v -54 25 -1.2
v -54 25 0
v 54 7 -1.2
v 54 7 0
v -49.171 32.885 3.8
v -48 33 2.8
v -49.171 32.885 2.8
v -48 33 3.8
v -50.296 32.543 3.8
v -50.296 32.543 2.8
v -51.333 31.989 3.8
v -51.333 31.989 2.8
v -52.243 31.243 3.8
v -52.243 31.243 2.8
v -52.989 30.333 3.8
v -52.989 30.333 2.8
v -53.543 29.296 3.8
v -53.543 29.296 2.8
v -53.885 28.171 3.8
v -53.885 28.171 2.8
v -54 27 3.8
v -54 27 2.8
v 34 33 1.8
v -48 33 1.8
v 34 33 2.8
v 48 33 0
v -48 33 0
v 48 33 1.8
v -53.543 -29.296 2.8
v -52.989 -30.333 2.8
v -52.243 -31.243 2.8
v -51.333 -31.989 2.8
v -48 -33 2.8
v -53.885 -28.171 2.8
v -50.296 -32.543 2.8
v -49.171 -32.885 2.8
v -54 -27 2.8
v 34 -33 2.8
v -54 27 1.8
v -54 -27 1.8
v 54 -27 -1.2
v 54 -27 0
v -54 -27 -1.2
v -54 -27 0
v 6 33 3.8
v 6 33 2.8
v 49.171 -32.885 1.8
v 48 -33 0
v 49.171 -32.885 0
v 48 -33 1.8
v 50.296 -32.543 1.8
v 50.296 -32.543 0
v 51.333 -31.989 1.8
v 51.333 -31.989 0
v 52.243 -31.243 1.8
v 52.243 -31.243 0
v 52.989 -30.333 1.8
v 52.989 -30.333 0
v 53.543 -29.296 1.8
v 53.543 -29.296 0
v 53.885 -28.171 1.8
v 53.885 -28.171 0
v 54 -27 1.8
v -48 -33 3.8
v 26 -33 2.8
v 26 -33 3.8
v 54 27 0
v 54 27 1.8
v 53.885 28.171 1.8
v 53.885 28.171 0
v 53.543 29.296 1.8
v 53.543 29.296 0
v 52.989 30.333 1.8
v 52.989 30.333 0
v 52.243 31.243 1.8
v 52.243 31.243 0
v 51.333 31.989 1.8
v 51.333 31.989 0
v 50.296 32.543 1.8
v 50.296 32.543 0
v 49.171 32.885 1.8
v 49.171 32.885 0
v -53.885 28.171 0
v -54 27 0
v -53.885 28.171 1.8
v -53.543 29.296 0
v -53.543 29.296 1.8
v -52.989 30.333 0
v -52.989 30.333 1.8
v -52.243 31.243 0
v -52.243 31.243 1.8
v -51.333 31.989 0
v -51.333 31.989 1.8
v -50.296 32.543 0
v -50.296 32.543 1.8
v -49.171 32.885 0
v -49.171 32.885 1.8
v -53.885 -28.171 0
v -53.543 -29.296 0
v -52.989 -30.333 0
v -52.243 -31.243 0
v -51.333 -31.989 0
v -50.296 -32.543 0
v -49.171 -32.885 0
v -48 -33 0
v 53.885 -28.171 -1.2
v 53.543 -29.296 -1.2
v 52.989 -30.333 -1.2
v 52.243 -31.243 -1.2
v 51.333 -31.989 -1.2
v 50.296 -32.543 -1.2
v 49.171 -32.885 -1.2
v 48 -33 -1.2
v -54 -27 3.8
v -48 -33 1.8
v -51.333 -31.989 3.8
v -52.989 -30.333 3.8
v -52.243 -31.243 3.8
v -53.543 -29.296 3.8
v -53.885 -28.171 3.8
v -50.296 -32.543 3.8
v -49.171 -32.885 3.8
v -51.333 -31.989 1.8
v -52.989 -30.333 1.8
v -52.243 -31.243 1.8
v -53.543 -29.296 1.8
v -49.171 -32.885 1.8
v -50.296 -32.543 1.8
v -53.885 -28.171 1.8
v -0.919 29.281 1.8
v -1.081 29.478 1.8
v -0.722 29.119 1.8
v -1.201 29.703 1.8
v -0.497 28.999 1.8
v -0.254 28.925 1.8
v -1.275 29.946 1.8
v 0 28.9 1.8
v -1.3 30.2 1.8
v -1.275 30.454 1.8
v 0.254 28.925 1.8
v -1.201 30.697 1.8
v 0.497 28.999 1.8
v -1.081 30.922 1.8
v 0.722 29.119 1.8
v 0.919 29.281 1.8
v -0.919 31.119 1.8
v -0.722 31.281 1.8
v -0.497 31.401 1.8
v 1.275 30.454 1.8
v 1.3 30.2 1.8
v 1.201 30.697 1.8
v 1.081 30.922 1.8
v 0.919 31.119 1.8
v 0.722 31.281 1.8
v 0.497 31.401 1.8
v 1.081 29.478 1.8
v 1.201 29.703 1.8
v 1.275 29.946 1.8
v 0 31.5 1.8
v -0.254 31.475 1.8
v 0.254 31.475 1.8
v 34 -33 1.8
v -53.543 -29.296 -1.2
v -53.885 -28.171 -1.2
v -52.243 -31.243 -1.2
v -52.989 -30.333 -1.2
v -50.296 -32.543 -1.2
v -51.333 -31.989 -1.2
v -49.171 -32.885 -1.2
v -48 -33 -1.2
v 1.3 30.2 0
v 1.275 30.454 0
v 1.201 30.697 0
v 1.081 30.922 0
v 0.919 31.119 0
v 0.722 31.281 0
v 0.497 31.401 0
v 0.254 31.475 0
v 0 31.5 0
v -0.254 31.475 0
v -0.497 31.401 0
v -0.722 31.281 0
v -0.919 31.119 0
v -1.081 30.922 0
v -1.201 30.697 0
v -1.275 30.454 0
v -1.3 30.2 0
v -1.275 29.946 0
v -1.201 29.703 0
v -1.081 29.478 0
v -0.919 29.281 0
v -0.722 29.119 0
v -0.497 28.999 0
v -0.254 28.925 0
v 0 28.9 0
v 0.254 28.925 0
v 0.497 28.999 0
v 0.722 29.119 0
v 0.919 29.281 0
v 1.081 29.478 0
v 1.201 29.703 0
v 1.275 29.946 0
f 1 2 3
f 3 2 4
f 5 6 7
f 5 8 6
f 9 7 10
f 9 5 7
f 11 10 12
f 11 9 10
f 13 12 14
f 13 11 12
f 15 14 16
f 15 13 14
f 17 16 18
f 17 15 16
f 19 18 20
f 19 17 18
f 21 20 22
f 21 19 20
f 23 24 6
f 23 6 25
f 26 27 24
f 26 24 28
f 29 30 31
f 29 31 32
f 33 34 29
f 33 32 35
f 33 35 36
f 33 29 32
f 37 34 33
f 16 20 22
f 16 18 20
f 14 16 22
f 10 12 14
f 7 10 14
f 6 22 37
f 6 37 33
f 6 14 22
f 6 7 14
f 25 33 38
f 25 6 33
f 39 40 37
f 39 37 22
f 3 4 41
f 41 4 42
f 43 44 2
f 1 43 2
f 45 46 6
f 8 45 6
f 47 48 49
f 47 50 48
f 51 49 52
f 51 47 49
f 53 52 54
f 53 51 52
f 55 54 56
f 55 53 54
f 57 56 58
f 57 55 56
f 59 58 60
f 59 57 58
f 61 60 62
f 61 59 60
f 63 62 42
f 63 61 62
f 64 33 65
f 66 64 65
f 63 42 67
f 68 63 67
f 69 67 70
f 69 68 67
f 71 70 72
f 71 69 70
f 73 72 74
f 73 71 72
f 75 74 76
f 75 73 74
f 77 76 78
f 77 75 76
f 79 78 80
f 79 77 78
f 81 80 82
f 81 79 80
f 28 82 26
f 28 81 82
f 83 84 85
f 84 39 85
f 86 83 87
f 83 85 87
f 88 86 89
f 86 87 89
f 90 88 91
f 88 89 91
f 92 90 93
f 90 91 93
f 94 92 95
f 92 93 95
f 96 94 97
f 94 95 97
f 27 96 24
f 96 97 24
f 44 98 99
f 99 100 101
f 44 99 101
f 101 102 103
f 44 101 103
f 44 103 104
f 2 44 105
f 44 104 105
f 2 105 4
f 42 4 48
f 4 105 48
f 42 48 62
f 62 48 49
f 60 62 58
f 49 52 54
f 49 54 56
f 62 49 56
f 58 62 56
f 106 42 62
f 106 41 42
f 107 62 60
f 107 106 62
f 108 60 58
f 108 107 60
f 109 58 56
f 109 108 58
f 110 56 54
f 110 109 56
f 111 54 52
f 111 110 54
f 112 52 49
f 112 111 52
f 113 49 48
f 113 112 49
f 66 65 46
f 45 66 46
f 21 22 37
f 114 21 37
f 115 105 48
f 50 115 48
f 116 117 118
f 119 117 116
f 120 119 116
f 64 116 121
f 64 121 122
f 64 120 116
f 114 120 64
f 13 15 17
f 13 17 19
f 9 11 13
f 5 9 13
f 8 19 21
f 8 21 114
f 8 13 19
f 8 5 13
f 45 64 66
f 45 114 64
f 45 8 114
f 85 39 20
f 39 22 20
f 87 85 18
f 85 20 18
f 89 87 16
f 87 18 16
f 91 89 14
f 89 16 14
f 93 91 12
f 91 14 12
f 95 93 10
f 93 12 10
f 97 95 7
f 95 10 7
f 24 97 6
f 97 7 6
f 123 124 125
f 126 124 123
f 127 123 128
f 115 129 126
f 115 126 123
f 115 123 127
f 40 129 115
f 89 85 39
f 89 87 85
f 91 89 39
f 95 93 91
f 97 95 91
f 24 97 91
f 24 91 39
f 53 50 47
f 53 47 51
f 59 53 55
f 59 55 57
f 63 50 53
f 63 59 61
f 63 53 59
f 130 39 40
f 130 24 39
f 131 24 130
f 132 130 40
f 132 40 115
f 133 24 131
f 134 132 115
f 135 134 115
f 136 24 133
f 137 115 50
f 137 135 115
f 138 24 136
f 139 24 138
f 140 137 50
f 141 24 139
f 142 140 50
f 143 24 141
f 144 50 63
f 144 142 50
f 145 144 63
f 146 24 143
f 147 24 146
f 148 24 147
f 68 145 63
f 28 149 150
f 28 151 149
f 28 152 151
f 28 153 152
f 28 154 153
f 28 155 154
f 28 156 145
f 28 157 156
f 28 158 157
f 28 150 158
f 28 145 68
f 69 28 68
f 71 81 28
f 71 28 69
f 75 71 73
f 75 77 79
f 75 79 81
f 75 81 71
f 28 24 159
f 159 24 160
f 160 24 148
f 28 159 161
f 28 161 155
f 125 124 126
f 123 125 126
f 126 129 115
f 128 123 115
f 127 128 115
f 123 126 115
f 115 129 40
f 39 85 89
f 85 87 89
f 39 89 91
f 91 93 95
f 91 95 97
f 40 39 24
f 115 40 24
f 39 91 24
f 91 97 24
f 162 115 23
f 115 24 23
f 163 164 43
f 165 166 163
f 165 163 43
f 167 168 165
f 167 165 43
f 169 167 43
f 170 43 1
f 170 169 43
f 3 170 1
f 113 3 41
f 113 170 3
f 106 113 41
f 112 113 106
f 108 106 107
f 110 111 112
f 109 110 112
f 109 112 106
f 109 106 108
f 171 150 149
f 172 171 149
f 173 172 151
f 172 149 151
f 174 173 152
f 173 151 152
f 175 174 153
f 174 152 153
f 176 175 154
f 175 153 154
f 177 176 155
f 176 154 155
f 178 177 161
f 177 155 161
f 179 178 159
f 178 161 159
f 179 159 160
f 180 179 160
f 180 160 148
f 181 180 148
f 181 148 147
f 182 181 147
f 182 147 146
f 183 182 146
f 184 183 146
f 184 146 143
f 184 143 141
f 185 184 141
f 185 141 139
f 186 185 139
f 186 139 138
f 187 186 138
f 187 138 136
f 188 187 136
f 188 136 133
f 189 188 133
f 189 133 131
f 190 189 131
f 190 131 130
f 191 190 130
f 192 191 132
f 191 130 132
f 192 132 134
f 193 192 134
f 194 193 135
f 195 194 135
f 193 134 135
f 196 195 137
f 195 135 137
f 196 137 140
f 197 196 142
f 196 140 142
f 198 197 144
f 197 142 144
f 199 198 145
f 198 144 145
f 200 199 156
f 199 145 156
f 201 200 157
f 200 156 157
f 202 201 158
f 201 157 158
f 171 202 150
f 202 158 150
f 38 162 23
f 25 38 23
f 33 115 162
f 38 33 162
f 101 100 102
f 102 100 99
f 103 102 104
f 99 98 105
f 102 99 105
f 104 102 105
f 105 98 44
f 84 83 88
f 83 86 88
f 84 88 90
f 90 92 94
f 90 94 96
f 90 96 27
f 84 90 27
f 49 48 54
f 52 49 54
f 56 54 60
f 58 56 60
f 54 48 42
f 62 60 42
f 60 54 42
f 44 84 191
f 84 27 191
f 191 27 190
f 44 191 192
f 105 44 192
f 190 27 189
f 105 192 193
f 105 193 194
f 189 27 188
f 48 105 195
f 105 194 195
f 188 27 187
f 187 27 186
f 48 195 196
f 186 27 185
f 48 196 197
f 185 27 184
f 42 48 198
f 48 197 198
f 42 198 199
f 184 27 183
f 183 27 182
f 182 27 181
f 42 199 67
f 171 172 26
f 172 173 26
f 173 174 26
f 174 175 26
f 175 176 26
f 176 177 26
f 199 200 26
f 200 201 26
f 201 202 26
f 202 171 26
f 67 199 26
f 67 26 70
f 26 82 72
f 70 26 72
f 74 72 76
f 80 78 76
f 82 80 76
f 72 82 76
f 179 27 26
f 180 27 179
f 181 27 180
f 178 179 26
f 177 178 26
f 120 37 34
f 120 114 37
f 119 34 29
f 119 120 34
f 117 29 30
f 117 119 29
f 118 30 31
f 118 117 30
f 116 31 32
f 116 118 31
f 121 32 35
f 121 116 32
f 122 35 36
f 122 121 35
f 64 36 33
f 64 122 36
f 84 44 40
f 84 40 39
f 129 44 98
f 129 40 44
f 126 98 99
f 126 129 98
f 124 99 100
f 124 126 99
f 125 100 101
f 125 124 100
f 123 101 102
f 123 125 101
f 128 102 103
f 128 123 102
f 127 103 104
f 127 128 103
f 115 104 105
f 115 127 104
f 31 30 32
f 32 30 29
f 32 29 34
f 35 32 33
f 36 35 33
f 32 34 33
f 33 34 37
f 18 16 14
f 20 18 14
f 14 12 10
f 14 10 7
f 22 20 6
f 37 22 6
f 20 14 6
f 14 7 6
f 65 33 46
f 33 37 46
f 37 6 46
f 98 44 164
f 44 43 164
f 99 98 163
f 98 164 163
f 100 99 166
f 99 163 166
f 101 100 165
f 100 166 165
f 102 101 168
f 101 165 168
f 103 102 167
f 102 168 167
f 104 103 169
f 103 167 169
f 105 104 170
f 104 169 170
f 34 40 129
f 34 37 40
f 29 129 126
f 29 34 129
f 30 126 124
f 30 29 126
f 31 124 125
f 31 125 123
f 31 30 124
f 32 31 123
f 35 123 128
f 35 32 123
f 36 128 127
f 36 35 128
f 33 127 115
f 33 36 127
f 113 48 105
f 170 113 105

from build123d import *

# Parameters (mm, degrees)
F0_W      = 108
F0_H      = 66
F1_DEPTH  = 1.8
F3_DEPTH  = 1.2
F4_W      = 88
F4_H      = 66
F5_DEPTH  = 1
F7_DEPTH  = 1
F8_R      = 6
F8_2_R    = 6
F8_3_R    = 6
F8_4_R    = 6
F9_R      = 1.3
F10_DEPTH = 25


with BuildPart() as f1:
    # F0 (on Top) → F1 (new body)
    with BuildSketch(Plane.XY):
        Rectangle(F0_W, F0_H)
    extrude(amount=F1_DEPTH)

    # F8
    f8_edges = [f1.edges().sort_by_distance(p)[0] for p in [
        (-54, 33, 0.9),
        (-54, -33, 0.9),
        (54, -33, 0.9),
        (54, 33, 0.9),
    ]]
    fillet(f8_edges, radius=F8_R)

    # F9 (on face) → F10 (cut)
    with BuildSketch(Plane.XY.offset(1.8)):
        with Locations((0, 30.2)):
            Circle(F9_R)
    extrude(amount=-F10_DEPTH, mode=Mode.SUBTRACT)


with BuildPart() as f3:
    # F2 (on face) → F3 (new body)
    with BuildSketch(Plane(origin=(0, 0, 0), x_dir=(1, 0, 0), z_dir=(0, 0, -1))):
        Polygon((-54, 33), (-54, -25), (54, -7), (54, 33), align=None)
    extrude(amount=F3_DEPTH)

    # F8#4
    f8_4_edges = [f3.edges().sort_by_distance(p)[0] for p in [
        (-54, -33, -0.6),
        (54, -33, -0.6),
    ]]
    fillet(f8_4_edges, radius=F8_4_R)


with BuildPart() as f5:
    # F4 (on face) → F5 (new body)
    with BuildSketch(Plane.XY.offset(1.8)):
        with Locations((-10, 0)):
            Rectangle(F4_W, F4_H)
    extrude(amount=F5_DEPTH)

    # F8#2
    f8_2_edges = [f5.edges().sort_by_distance(p)[0] for p in [
        (-54, 33, 2.3),
        (-54, -33, 2.3),
    ]]
    fillet(f8_2_edges, radius=F8_2_R)


with BuildPart() as f7:
    # F6 (on face) → F7 (new body)
    with BuildSketch(Plane.XY.offset(2.8)):
        Polygon((6, 33), (-54, 33), (-54, -33), (26, -33), align=None)
    extrude(amount=F7_DEPTH)

    # F8#3
    f8_3_edges = [f7.edges().sort_by_distance(p)[0] for p in [
        (-54, 33, 3.3),
        (-54, -33, 3.3),
    ]]
    fillet(f8_3_edges, radius=F8_3_R)


solid = Compound([f1.part, f3.part, f5.part, f7.part])
